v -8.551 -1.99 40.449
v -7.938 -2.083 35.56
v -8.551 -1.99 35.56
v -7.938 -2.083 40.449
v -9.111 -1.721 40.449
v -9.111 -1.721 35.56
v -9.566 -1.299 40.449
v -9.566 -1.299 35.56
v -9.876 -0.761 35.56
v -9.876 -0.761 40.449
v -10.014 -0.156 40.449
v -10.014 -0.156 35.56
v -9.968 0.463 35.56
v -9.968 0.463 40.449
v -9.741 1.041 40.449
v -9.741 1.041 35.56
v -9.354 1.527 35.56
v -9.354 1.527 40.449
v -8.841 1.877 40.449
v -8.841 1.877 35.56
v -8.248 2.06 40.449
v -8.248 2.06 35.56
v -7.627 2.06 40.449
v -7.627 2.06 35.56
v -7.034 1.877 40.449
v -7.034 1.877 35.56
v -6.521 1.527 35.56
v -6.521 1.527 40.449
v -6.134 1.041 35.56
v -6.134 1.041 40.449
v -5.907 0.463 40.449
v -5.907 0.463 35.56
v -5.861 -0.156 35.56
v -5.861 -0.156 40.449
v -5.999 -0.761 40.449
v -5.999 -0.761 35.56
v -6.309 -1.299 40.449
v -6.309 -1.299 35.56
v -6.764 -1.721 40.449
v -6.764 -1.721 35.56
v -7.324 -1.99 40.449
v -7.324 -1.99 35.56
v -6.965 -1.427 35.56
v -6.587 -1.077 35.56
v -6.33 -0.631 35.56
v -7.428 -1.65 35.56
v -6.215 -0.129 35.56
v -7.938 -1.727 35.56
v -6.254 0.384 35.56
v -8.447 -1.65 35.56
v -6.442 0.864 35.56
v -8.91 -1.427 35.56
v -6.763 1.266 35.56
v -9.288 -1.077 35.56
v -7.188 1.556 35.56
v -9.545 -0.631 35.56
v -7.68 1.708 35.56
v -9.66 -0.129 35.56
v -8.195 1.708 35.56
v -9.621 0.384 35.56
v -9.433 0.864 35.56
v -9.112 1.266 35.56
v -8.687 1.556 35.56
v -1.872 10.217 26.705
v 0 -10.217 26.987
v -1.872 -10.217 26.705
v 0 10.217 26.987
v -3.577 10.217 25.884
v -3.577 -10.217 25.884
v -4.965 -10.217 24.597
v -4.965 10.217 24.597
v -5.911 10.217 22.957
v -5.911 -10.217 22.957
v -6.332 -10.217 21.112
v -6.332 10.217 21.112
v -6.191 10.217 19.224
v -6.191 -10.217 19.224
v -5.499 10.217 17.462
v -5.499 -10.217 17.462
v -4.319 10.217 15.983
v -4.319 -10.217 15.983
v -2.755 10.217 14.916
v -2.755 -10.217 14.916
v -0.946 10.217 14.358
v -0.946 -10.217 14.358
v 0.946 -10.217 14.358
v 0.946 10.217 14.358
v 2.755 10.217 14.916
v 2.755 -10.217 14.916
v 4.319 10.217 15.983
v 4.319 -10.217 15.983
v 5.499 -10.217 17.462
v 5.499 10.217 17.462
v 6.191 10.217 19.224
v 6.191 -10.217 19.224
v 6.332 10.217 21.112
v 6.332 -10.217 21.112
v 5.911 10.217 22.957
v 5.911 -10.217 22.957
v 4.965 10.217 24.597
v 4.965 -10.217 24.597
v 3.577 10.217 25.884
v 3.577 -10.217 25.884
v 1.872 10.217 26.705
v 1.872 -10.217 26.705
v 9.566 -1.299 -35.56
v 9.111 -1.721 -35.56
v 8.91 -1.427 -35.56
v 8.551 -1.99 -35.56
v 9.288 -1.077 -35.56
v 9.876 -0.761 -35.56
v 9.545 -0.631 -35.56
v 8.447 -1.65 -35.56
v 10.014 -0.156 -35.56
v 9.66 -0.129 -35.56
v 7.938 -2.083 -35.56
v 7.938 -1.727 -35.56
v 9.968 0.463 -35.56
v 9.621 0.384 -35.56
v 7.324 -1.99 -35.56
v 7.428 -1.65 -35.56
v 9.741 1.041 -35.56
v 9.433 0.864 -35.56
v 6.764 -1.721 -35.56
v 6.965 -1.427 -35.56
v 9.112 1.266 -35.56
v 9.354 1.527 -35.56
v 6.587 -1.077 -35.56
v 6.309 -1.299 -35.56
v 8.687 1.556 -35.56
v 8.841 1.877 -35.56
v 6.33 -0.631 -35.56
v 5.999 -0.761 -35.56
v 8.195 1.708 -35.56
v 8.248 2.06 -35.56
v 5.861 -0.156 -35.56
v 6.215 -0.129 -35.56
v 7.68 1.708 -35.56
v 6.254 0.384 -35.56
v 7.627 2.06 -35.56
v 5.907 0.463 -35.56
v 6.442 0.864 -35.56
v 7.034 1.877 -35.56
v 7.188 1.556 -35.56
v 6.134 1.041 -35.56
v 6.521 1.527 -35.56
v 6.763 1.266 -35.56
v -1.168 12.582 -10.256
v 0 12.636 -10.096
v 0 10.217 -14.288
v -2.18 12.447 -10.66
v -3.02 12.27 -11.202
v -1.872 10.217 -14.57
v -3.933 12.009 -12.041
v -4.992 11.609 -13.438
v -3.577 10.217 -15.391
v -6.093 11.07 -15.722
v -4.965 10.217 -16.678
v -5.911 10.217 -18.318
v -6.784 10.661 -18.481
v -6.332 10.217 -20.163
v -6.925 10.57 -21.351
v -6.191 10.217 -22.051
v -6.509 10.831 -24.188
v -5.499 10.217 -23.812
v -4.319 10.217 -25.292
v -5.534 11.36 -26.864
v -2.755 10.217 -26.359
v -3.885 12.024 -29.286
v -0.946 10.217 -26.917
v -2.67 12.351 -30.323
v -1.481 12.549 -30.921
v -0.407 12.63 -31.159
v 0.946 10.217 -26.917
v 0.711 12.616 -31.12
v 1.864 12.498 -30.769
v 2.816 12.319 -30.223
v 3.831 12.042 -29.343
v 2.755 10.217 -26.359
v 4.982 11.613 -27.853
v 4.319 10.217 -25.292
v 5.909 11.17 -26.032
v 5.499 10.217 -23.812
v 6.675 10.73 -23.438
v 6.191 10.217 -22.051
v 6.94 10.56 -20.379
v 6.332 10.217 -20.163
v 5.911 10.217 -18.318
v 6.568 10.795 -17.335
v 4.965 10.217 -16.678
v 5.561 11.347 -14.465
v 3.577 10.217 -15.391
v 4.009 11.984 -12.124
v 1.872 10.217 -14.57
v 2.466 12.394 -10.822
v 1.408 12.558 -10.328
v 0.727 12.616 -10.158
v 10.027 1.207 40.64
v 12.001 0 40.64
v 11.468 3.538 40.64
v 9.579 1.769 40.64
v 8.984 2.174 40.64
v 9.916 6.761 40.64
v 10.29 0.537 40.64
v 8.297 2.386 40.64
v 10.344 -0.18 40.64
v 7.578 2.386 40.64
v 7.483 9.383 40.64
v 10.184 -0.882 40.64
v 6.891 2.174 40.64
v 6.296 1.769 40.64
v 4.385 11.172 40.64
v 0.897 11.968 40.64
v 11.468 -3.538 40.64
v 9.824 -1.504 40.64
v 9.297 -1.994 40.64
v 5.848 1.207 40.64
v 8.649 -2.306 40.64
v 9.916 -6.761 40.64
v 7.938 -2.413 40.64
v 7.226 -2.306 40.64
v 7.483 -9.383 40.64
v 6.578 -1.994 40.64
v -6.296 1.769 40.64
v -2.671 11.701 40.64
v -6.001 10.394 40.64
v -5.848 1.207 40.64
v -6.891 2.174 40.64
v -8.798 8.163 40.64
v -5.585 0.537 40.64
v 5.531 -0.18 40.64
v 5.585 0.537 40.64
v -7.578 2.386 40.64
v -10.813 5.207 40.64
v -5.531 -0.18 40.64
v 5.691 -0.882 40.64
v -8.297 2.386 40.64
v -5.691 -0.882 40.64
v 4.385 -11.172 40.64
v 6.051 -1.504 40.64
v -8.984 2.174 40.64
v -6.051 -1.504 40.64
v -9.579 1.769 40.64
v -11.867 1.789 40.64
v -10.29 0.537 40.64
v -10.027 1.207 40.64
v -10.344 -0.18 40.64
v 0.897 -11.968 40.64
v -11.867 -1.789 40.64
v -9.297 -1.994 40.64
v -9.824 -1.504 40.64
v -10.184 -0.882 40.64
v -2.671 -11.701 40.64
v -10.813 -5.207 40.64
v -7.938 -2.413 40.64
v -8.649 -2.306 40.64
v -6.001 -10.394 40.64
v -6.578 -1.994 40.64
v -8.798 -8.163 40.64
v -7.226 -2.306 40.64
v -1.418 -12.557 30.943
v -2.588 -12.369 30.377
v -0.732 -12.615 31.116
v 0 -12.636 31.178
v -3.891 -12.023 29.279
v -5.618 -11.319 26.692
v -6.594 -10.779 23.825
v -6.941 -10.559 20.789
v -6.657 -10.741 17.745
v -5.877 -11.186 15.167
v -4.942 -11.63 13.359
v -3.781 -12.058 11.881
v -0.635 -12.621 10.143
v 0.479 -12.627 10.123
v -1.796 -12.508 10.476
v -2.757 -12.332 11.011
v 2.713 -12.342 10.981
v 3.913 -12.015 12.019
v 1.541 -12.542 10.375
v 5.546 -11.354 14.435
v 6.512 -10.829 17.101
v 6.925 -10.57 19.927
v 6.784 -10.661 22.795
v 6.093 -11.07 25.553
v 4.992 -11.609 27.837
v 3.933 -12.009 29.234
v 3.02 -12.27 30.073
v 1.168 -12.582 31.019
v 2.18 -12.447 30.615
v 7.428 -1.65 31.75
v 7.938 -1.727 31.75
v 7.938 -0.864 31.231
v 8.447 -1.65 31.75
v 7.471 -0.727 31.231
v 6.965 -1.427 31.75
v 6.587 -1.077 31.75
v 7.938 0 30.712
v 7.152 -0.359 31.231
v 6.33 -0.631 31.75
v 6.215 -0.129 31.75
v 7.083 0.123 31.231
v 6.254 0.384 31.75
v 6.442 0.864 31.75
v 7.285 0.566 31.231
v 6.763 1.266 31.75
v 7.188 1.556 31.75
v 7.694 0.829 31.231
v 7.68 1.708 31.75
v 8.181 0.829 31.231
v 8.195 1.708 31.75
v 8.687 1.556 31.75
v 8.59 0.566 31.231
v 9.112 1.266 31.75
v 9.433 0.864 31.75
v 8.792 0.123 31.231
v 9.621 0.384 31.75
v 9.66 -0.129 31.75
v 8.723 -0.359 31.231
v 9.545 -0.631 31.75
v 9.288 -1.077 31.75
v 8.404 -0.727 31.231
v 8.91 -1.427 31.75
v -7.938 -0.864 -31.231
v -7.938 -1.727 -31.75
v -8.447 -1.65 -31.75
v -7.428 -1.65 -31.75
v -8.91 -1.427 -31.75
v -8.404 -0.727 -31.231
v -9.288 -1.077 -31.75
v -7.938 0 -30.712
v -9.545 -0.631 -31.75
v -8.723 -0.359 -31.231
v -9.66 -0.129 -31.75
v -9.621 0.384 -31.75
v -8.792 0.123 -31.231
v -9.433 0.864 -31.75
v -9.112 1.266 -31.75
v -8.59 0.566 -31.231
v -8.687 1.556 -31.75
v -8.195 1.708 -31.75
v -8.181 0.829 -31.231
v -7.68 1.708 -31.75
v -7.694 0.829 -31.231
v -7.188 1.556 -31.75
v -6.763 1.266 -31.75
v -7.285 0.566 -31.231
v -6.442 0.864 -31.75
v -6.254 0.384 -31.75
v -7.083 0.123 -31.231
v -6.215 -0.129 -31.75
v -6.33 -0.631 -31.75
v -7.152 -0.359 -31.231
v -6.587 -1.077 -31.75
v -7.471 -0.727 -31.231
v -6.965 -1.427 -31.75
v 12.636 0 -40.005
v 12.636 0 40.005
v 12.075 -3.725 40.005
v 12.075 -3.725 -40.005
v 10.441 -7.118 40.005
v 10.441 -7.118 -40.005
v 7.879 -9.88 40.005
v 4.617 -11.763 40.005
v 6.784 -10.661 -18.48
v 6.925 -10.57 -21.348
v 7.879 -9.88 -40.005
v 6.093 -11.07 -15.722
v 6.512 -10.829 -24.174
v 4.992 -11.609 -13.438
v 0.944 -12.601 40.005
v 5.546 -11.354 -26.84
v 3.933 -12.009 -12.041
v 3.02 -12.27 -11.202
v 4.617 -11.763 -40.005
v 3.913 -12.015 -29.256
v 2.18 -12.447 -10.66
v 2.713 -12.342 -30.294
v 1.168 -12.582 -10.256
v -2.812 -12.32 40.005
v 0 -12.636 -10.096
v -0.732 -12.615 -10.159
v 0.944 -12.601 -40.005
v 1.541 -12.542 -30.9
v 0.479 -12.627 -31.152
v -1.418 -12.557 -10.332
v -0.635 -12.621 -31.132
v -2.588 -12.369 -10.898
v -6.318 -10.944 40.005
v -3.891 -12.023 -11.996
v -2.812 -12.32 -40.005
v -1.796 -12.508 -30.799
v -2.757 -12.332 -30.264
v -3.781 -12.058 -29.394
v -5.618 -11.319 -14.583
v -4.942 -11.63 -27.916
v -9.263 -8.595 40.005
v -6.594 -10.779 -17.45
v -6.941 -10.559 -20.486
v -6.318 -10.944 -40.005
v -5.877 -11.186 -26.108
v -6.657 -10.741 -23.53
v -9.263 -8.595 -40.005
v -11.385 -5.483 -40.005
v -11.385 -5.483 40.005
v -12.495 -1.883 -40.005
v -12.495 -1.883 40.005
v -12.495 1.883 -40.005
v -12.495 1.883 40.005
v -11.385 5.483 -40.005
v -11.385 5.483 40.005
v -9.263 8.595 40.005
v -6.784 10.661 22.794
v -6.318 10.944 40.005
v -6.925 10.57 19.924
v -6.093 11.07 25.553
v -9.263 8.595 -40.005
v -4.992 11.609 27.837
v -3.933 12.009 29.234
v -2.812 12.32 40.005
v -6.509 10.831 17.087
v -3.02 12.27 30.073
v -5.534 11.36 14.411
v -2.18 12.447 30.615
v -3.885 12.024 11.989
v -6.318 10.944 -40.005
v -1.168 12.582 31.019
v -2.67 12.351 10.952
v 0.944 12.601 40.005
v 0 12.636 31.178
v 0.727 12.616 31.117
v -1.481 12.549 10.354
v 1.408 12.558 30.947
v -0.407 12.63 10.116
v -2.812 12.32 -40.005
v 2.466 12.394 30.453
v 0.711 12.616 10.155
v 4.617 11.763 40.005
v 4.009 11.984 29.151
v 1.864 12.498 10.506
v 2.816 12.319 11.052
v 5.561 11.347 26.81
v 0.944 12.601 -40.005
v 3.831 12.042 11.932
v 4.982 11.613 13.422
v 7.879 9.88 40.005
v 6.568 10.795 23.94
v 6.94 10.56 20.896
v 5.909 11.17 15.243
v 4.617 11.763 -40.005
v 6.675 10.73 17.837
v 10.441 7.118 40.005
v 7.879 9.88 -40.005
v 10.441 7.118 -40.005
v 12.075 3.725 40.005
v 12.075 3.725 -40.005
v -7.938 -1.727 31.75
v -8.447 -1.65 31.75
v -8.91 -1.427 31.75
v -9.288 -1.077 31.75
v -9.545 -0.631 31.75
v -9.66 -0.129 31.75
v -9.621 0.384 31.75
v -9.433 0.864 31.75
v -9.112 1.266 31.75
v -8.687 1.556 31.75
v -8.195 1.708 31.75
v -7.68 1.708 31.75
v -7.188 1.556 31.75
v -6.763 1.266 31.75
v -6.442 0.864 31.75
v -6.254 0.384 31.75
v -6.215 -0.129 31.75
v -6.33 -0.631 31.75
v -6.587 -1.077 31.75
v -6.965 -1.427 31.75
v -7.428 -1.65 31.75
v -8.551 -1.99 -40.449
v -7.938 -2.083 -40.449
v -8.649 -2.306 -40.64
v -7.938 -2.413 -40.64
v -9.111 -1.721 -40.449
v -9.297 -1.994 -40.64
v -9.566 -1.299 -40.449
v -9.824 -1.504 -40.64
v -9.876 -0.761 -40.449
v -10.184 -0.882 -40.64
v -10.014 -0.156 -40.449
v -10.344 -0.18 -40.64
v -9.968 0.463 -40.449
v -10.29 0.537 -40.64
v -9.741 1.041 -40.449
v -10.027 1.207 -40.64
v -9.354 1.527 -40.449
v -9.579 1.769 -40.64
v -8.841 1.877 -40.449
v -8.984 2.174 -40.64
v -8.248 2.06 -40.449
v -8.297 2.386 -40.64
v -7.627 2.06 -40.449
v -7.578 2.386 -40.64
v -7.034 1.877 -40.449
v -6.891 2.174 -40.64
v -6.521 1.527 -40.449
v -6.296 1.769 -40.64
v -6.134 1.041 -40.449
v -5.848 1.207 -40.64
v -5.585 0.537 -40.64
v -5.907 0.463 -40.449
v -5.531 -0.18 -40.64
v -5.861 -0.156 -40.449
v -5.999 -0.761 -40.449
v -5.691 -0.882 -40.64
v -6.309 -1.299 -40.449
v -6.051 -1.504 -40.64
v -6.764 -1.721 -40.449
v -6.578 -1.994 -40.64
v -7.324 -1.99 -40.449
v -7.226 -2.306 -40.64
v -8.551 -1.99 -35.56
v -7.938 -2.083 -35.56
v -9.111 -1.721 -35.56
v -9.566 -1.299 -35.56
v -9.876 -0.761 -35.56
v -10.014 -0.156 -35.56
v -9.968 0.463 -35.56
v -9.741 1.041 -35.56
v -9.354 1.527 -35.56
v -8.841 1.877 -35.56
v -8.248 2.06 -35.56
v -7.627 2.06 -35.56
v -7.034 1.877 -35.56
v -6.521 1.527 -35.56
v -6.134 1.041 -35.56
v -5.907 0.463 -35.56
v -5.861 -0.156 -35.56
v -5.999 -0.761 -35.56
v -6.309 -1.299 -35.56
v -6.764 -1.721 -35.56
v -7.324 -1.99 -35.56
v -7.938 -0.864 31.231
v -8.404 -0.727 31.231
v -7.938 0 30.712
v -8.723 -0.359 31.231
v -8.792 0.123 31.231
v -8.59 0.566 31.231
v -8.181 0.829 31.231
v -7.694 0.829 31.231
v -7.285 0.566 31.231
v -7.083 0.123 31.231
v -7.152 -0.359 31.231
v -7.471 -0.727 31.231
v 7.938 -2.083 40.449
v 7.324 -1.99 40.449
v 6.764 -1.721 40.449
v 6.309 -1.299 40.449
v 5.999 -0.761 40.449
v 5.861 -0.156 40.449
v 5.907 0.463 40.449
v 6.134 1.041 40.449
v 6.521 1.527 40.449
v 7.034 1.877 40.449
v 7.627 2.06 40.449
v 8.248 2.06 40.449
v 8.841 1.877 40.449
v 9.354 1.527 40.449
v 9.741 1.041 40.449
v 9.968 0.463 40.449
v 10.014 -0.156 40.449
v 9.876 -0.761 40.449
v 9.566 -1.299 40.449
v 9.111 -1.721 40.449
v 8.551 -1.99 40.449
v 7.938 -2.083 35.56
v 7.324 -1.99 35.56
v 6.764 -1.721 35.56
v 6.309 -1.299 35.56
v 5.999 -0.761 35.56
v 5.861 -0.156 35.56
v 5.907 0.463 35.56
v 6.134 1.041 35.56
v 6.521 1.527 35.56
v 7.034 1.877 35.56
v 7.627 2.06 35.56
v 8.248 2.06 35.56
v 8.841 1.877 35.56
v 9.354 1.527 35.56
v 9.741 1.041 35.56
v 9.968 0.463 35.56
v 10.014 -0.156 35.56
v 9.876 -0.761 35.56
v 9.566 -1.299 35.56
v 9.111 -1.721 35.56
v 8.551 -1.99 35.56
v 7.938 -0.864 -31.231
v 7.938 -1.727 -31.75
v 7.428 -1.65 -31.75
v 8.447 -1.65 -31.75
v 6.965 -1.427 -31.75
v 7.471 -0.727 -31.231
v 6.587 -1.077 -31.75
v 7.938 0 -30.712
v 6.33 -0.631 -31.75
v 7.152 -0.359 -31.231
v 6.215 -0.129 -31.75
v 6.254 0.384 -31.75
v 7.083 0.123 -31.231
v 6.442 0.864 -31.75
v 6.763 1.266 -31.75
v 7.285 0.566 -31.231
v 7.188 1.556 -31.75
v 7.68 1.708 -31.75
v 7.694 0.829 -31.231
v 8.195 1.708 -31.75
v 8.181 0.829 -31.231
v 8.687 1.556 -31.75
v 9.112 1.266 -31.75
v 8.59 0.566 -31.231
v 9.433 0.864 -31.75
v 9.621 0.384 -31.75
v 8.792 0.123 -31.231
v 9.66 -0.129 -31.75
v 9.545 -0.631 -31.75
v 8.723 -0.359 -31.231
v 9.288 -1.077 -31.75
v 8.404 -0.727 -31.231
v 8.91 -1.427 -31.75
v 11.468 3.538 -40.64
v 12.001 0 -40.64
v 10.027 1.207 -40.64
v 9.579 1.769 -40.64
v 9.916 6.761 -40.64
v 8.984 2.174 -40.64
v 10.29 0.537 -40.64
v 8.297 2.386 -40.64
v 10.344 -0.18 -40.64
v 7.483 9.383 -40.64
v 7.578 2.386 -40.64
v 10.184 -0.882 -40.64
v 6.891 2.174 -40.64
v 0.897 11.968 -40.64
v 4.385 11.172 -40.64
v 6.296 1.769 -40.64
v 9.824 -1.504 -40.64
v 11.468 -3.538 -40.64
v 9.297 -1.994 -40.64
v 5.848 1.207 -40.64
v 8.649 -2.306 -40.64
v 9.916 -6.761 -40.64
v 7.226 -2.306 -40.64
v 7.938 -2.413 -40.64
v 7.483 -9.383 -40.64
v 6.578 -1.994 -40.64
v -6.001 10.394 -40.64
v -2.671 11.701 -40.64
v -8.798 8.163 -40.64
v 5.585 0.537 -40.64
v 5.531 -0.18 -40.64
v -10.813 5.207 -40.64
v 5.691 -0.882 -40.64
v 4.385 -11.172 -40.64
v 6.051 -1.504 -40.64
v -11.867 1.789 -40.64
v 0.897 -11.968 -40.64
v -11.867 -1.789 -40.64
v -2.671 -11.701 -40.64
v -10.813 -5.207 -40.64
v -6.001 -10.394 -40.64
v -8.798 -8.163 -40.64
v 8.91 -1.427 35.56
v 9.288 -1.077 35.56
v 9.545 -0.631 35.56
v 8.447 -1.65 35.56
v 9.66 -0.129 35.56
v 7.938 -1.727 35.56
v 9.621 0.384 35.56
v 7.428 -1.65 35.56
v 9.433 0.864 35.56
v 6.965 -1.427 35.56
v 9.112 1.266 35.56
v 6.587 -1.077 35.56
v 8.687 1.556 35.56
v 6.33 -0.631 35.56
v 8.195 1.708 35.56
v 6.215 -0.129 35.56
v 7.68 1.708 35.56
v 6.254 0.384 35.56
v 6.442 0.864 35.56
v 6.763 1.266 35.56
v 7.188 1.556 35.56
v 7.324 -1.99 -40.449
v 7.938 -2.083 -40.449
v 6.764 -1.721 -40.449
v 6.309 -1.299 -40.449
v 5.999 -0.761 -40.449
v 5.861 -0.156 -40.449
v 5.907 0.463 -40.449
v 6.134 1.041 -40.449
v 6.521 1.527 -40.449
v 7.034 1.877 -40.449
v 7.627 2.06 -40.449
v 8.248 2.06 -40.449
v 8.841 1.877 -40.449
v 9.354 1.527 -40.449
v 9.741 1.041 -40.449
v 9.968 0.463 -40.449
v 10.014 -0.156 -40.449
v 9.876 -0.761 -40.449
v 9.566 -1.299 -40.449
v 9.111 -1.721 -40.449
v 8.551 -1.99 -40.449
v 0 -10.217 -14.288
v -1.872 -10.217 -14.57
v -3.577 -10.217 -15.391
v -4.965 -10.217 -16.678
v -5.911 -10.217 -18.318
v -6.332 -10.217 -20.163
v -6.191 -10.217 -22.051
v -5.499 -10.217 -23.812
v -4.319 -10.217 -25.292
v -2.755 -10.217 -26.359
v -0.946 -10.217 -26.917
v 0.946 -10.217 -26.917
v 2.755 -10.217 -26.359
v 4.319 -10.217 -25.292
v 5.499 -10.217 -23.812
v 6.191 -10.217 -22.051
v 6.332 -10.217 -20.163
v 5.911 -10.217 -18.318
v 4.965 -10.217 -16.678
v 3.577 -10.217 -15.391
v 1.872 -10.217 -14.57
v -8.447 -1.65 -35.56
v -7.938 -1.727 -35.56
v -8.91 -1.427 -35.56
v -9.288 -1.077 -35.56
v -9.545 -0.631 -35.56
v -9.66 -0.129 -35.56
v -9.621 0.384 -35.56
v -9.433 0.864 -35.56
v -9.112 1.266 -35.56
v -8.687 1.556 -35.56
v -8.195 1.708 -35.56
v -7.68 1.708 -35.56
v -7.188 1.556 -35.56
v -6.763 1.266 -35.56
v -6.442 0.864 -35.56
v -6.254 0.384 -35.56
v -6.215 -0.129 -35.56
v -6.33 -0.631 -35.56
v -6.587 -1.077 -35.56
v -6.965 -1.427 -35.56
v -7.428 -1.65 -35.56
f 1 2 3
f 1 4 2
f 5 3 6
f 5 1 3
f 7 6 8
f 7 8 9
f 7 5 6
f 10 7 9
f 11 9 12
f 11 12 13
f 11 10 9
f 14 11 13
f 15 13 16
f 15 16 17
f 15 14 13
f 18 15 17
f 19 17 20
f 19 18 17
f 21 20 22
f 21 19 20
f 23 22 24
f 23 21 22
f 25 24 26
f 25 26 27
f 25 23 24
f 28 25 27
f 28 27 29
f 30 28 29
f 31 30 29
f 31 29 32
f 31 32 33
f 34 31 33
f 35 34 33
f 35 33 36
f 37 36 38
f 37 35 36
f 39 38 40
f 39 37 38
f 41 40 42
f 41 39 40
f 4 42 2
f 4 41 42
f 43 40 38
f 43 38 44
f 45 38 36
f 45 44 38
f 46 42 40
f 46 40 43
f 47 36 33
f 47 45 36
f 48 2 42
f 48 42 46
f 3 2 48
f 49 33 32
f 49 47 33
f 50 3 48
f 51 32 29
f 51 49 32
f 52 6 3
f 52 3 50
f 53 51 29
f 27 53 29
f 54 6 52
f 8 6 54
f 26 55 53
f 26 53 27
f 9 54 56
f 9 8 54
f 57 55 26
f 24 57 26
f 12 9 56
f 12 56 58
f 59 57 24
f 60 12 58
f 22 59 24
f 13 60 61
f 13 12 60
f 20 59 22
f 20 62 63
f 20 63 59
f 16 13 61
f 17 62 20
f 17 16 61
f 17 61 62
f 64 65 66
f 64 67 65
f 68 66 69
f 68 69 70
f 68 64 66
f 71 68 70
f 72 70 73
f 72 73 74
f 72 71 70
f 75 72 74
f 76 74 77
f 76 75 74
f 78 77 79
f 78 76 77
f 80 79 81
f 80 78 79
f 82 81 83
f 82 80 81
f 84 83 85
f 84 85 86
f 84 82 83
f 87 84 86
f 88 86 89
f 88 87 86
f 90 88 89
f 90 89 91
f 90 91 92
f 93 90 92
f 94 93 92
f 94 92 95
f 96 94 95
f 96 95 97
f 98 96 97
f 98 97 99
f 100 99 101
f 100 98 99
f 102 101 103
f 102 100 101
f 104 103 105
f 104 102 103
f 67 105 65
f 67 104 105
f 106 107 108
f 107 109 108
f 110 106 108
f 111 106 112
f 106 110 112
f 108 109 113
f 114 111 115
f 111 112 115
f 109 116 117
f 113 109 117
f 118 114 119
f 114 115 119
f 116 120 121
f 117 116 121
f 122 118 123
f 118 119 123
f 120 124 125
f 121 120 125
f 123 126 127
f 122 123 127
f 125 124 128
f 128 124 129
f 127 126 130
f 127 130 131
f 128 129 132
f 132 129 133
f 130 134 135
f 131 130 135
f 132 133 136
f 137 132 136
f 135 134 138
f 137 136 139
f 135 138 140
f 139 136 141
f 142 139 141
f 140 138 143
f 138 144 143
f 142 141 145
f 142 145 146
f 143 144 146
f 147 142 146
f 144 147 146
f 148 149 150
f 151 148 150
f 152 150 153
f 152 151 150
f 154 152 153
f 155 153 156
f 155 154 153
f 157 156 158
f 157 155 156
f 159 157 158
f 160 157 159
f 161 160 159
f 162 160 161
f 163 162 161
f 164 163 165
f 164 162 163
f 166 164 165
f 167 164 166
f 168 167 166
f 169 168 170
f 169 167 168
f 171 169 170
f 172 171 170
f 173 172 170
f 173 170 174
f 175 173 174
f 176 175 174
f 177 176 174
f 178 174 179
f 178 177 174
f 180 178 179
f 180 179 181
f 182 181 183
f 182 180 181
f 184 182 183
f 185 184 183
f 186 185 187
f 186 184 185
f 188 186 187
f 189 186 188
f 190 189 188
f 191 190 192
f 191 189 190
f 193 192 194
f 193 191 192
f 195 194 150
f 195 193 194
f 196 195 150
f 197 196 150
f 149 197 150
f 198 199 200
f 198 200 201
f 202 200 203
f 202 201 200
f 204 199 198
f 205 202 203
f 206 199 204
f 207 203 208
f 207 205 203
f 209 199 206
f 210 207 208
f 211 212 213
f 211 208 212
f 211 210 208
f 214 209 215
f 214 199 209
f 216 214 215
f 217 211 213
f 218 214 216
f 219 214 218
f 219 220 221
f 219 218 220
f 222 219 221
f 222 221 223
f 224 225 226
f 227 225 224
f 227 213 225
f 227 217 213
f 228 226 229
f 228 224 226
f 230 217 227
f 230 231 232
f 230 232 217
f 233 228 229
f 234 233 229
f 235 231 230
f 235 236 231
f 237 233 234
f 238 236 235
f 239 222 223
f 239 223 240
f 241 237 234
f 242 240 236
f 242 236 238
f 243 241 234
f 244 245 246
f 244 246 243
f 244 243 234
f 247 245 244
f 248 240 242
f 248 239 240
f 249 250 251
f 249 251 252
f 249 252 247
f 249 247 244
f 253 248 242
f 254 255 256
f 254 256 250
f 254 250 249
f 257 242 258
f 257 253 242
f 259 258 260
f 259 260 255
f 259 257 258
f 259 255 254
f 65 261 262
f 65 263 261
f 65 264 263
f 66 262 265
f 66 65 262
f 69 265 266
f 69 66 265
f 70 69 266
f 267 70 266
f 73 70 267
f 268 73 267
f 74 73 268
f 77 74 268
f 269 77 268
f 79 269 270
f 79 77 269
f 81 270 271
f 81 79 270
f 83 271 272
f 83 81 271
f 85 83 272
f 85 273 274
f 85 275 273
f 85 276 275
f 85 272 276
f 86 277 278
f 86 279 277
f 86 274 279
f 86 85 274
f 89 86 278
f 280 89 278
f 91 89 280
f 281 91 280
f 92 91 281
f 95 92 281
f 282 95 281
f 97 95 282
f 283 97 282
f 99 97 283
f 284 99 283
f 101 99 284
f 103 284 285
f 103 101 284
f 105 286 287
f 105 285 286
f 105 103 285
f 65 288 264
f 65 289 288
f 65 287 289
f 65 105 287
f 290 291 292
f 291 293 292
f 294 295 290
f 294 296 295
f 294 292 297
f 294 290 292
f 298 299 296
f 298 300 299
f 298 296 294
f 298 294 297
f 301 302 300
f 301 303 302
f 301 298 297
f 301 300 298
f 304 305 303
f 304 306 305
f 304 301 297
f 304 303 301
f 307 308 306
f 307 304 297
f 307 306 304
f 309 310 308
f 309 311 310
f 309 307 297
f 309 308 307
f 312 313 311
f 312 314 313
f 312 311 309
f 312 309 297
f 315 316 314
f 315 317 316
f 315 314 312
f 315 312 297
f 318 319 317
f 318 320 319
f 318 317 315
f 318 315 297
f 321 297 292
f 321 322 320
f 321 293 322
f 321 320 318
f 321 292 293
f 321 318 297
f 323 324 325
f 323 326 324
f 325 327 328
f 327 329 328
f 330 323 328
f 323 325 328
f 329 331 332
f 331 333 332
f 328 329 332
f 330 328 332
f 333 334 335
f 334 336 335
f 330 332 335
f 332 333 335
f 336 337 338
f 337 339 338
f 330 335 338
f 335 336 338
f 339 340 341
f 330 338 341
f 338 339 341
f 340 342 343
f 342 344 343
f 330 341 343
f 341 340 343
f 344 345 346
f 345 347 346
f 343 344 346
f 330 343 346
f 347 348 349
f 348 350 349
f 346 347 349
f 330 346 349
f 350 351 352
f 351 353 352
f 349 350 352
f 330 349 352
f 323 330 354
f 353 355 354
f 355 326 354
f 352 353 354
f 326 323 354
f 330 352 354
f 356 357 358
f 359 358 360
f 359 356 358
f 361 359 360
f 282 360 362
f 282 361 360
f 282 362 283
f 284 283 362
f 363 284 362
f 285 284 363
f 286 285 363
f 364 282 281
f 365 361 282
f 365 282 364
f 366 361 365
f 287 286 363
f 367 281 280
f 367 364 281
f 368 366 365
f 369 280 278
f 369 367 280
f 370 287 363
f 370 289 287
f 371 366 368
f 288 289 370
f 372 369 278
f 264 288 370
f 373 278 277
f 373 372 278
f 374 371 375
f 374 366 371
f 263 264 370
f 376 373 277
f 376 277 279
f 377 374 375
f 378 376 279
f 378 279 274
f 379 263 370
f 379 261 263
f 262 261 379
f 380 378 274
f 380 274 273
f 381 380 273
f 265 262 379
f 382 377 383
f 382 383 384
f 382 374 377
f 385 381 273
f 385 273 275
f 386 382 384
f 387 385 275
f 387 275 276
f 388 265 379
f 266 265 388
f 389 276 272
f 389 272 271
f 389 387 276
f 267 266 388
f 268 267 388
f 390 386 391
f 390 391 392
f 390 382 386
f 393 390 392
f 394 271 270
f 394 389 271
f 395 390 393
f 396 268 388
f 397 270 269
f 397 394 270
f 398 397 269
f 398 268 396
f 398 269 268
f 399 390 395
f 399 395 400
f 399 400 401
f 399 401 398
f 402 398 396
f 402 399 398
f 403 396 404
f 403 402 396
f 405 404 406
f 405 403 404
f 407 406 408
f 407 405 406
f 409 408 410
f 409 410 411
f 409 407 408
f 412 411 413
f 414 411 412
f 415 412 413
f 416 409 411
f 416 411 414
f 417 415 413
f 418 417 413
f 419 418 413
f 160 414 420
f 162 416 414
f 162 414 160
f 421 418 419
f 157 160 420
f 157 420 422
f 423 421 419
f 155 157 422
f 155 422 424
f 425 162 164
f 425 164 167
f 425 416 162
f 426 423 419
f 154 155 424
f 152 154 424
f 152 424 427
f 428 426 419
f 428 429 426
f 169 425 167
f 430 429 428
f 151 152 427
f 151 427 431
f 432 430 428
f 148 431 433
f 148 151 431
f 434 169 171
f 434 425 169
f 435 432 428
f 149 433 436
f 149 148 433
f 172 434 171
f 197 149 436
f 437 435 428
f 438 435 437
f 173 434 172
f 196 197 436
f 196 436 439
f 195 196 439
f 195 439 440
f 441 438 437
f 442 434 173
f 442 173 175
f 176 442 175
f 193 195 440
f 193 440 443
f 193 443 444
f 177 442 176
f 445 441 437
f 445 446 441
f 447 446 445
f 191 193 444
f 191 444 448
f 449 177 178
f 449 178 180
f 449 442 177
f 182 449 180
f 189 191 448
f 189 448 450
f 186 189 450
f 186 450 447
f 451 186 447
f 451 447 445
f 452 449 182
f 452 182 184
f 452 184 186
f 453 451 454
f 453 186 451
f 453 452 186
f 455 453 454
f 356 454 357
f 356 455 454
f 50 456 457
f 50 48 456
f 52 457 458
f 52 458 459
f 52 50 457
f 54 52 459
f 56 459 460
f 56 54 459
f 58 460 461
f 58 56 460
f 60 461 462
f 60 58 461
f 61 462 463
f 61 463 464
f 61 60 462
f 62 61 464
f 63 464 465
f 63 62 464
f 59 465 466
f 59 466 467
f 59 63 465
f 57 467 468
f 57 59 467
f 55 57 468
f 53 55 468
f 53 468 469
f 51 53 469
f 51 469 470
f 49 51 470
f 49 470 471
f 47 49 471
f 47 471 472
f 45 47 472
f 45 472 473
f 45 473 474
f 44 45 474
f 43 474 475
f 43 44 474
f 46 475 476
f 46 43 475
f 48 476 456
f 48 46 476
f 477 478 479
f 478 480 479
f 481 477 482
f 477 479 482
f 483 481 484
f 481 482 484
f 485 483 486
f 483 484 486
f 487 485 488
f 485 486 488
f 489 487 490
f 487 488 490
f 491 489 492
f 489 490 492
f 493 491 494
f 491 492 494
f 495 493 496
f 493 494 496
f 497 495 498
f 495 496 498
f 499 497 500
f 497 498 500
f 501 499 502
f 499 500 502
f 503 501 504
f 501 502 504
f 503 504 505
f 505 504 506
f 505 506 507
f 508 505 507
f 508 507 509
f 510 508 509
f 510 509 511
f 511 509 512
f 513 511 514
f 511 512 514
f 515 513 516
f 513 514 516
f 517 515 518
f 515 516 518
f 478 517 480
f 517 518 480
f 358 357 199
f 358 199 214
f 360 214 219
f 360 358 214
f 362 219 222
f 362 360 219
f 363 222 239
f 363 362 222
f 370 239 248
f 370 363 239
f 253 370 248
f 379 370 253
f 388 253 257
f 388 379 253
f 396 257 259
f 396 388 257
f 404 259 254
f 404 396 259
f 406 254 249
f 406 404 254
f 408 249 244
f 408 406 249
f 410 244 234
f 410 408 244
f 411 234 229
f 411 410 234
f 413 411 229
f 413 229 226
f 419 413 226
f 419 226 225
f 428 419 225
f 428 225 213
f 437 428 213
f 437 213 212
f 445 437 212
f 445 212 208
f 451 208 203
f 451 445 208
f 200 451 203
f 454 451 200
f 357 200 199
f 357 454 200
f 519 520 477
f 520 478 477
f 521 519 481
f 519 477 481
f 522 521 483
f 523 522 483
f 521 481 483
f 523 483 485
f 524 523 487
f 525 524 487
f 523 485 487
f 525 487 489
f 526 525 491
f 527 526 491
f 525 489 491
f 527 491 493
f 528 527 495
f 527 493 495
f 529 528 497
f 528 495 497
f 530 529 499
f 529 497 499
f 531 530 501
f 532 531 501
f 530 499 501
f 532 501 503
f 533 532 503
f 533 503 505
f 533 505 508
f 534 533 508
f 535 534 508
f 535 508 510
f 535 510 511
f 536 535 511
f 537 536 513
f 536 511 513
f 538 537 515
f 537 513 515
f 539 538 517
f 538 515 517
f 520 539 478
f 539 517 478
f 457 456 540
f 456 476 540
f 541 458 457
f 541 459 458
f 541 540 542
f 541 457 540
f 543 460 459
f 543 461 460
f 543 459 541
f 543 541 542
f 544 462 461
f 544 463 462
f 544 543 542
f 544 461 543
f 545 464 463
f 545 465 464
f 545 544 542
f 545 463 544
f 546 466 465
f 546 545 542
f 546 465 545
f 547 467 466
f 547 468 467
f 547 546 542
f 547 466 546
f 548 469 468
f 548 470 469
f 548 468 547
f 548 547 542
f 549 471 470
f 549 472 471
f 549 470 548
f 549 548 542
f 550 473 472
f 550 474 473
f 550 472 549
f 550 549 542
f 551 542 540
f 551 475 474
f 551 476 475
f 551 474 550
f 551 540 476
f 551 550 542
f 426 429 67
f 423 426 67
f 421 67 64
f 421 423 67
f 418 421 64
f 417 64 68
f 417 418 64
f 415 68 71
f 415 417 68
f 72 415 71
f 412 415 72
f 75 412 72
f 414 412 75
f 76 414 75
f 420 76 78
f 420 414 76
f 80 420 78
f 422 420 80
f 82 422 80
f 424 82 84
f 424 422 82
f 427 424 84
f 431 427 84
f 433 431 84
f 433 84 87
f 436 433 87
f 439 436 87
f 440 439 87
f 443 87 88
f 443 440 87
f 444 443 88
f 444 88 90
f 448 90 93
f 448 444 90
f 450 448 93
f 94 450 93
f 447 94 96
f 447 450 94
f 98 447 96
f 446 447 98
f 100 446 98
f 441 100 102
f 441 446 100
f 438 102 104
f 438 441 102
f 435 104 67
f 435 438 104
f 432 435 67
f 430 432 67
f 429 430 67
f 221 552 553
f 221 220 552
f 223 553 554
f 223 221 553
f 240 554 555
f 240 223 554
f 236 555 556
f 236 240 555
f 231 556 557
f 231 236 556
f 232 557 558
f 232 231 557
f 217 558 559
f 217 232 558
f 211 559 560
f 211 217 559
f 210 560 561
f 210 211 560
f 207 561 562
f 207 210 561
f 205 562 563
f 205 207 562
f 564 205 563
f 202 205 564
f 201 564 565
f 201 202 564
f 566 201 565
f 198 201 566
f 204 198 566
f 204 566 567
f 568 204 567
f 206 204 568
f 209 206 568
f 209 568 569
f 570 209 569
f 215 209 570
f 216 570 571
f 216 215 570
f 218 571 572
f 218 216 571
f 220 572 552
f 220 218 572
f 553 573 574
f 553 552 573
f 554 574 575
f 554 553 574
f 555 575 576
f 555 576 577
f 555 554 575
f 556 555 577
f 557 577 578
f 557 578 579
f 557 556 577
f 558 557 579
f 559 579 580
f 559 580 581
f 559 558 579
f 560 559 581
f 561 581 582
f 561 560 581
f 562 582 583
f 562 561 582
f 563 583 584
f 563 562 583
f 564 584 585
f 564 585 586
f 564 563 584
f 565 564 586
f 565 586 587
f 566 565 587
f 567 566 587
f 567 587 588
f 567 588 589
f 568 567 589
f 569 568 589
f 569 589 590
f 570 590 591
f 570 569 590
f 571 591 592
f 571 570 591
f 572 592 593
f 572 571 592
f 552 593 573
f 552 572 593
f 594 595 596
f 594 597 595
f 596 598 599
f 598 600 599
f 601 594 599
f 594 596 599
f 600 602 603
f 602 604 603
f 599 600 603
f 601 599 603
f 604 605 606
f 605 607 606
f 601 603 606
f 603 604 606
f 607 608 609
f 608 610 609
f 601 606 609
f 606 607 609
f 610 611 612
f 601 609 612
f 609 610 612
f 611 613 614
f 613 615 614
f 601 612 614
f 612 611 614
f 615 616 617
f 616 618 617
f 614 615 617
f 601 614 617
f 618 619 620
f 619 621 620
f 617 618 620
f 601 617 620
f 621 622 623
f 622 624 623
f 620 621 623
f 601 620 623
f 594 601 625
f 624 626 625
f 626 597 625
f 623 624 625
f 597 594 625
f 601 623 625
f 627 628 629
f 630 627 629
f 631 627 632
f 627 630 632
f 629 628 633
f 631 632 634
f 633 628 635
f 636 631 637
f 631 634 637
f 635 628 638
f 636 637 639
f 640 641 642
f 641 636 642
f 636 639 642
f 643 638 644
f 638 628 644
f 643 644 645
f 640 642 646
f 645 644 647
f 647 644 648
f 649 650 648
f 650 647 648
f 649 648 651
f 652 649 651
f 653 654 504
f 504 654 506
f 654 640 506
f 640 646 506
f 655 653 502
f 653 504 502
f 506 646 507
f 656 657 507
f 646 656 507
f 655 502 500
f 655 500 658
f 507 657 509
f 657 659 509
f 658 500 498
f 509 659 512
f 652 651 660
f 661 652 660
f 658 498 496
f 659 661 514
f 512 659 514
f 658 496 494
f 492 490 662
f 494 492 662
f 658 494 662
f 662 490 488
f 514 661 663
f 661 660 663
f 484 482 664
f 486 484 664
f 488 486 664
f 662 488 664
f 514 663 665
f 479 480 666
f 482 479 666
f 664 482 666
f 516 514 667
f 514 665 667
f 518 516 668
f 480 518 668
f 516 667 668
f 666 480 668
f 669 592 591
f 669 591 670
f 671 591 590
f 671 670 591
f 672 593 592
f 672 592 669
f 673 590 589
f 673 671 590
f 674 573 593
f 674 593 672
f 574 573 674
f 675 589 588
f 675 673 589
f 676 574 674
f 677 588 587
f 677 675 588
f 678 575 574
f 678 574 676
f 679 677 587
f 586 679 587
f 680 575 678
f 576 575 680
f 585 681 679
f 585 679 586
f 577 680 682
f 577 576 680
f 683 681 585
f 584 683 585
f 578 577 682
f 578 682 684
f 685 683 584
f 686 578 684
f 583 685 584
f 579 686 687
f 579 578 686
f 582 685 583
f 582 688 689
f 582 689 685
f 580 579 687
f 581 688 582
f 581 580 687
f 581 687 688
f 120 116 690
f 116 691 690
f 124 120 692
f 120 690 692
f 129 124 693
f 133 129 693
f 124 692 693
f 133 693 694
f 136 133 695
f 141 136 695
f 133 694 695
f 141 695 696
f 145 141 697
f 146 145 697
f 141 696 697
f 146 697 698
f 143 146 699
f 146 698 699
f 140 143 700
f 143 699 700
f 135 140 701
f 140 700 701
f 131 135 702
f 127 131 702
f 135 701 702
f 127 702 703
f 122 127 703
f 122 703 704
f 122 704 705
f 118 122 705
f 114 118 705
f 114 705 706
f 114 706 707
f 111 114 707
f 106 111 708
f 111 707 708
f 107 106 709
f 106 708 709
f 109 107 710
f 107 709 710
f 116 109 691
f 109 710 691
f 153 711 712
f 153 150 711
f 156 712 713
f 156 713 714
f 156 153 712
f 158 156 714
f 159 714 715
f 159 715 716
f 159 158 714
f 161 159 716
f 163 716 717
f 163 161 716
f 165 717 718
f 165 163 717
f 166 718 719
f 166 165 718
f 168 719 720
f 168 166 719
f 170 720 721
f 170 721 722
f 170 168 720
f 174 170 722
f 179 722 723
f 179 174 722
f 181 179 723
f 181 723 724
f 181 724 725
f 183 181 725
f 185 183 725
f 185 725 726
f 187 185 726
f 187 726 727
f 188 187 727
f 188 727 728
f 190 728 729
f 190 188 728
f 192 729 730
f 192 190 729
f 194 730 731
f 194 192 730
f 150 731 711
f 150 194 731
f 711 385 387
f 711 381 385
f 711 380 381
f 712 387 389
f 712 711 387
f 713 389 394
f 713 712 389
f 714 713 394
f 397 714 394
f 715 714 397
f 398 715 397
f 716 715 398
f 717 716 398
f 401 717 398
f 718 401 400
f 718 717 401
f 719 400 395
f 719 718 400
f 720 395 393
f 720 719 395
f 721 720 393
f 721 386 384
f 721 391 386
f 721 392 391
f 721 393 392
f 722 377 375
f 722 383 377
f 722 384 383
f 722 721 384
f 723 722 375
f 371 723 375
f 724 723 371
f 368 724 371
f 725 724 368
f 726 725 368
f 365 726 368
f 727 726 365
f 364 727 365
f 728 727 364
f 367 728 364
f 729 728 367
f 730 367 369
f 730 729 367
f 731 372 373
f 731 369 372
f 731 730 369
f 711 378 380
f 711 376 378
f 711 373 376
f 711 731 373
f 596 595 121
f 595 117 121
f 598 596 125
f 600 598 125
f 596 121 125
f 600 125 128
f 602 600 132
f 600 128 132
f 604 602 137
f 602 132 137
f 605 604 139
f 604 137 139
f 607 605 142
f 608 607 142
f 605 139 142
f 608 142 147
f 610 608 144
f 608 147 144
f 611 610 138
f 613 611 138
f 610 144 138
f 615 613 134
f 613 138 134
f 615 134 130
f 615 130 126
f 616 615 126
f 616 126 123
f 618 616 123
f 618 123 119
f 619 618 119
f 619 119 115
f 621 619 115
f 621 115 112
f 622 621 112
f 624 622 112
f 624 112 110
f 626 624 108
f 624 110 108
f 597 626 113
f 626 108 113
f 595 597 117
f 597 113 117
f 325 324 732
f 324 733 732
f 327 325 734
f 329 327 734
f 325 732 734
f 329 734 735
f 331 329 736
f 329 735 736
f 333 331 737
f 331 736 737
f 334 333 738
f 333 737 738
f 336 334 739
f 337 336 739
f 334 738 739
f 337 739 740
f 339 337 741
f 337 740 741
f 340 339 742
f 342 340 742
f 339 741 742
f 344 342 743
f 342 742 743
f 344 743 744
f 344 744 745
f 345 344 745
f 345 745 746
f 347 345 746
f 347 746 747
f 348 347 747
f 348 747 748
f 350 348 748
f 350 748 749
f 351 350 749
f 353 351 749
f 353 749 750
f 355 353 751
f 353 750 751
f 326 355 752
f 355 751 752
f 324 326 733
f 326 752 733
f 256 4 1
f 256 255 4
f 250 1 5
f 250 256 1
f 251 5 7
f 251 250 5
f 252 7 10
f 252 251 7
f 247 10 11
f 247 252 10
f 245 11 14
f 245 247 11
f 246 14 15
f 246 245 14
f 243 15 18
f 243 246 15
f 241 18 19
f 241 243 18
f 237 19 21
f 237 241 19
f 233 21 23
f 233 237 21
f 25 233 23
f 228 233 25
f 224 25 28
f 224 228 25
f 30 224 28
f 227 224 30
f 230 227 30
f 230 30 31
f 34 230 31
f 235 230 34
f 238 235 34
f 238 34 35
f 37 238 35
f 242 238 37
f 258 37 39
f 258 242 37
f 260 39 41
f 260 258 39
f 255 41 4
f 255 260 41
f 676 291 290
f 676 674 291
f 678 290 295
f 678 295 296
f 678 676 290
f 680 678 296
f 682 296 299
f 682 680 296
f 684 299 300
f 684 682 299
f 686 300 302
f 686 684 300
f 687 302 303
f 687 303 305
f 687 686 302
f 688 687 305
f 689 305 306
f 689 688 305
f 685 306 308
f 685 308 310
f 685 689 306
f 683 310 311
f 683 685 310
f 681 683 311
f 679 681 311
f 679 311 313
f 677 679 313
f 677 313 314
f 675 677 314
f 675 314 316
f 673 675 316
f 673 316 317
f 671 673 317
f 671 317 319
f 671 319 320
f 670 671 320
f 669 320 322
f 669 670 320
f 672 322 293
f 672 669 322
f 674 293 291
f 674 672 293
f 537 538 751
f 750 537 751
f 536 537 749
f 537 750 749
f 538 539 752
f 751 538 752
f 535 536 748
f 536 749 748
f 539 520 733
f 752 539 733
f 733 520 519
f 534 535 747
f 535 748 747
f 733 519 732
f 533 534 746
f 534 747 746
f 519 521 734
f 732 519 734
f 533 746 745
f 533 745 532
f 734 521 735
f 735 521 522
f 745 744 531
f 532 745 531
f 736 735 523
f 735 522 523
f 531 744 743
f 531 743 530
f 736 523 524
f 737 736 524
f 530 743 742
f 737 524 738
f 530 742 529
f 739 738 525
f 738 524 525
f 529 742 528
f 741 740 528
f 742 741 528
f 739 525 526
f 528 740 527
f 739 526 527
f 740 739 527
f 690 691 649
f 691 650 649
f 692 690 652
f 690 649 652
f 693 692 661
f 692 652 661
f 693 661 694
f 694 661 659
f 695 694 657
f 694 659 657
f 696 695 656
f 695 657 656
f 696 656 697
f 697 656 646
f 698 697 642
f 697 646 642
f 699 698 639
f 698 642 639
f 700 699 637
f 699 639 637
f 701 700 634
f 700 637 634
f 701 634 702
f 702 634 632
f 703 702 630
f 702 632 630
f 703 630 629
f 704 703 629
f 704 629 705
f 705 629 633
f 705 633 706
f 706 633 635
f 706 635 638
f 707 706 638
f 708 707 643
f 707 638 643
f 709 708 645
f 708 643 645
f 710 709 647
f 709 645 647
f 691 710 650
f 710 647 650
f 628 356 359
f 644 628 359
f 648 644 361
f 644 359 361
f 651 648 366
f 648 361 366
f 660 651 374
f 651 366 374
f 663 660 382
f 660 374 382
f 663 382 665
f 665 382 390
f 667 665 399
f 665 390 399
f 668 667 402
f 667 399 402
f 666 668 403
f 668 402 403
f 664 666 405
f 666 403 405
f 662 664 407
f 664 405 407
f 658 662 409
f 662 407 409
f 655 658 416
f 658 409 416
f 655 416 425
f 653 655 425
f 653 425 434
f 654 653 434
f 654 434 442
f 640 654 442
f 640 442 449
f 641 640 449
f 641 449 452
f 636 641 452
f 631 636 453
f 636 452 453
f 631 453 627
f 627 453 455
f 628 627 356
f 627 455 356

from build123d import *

# Parameters (mm, degrees)
SKETCH1_W                      = 81.28
SKETCH1_H                      = 12.6365
CHAMFER1_SIZE                  = 0.635
LPATTERN3_COUNT                = 2
LPATTERN3_PITCH                = 41.275
F_8_32_TAPPED_HOLE1_AT_2_COUNT = 2
F_8_32_TAPPED_HOLE1_AT_2_PITCH = 15.875


with BuildPart() as part:
    # Sketch1 → Base-Revolve (revolve)
    with BuildSketch(Plane(origin=(0, 0, 0), x_dir=(0, 0, -1), z_dir=(1, 0, 0)), mode=Mode.PRIVATE) as base_revolve_sk:
        with Locations((0, 6.31825)):
            Rectangle(SKETCH1_W, SKETCH1_H)
    revolve(base_revolve_sk.sketch.rotate(Axis((0, 0, 40.64), (0, 0, -1)), 90), axis=Axis((0, 0, 40.64), (0, 0, -1)))  # turned: the seam where the file's is

    # Chamfer1
    chamfer1_edges = [part.edges().sort_by_distance(p)[0] for p in [
        (-12.6365, 0, -40.64),
        (-12.6365, 0, 40.64),
    ]]
    chamfer(chamfer1_edges, length=CHAMFER1_SIZE)

    # Sketch17 → 1_2-13 Tapped Hole1 (revolve, cut)
    with BuildSketch(Plane(origin=(0, 12.6365, -20.6375), x_dir=(0, 0, 1), z_dir=(1, 0, 0))):
        Polygon((0, 0), (0, 25.273), (10.541, 25.273), (6.35, 22.853325022), (6.35, 2.419674978), (10.541, 0), align=None)
    f_1_2_13_tapped_hole1 = revolve(axis=Axis((0, 18.9865, -20.6375), (0, -1, 0)), mode=Mode.SUBTRACT)

    # LPattern3: 1_2-13 Tapped Hole1 ×2
    with Locations(*[(0, 0, i * LPATTERN3_PITCH) for i in range(1, LPATTERN3_COUNT)]):
        add(f_1_2_13_tapped_hole1, mode=Mode.SUBTRACT)

    # Sketch19 → 8-32 Tapped Hole1 (revolve, cut)
    with BuildSketch(Plane(origin=(7.9375, 0, 40.64), x_dir=(0, -1, 0), z_dir=(1, 0, 0))):
        Polygon((0, 0), (0, 9.927806461), (1.7272, 8.89), (1.7272, 5.08), (2.0828, 5.08), (2.0828, 0.190641059), (2.413, 0), align=None)
    f_8_32_tapped_hole1 = revolve(axis=Axis((7.9375, 0, 46.99), (0, 0, -1)), mode=Mode.SUBTRACT)

    # 8-32 Tapped Hole1 at 2: 8-32 Tapped Hole1 ×2
    with Locations(*[(-i * F_8_32_TAPPED_HOLE1_AT_2_PITCH, 0, 0) for i in range(1, F_8_32_TAPPED_HOLE1_AT_2_COUNT)]):
        add(f_8_32_tapped_hole1, mode=Mode.SUBTRACT)

    # Mirror1: 8-32 Tapped Hole1 across plane
    add(f_8_32_tapped_hole1.mirror(Plane.XY), mode=Mode.SUBTRACT)

    # Mirror1 copy 1 sketch → Mirror1 copy 1 (revolve, cut)
    with BuildSketch(Plane(origin=(-7.9375, 0, -40.64), x_dir=(0, -1, 0), z_dir=(1, 0, 0))):
        Polygon((0, 0), (0, -9.927806461), (1.7272, -8.89), (1.7272, -5.08), (2.0828, -5.08), (2.0828, -0.190641059), (2.413, 0), align=None)
    revolve(axis=Axis((-7.9375, 0, -46.99), (0, 0, -1)), mode=Mode.SUBTRACT)


solid = part.part
